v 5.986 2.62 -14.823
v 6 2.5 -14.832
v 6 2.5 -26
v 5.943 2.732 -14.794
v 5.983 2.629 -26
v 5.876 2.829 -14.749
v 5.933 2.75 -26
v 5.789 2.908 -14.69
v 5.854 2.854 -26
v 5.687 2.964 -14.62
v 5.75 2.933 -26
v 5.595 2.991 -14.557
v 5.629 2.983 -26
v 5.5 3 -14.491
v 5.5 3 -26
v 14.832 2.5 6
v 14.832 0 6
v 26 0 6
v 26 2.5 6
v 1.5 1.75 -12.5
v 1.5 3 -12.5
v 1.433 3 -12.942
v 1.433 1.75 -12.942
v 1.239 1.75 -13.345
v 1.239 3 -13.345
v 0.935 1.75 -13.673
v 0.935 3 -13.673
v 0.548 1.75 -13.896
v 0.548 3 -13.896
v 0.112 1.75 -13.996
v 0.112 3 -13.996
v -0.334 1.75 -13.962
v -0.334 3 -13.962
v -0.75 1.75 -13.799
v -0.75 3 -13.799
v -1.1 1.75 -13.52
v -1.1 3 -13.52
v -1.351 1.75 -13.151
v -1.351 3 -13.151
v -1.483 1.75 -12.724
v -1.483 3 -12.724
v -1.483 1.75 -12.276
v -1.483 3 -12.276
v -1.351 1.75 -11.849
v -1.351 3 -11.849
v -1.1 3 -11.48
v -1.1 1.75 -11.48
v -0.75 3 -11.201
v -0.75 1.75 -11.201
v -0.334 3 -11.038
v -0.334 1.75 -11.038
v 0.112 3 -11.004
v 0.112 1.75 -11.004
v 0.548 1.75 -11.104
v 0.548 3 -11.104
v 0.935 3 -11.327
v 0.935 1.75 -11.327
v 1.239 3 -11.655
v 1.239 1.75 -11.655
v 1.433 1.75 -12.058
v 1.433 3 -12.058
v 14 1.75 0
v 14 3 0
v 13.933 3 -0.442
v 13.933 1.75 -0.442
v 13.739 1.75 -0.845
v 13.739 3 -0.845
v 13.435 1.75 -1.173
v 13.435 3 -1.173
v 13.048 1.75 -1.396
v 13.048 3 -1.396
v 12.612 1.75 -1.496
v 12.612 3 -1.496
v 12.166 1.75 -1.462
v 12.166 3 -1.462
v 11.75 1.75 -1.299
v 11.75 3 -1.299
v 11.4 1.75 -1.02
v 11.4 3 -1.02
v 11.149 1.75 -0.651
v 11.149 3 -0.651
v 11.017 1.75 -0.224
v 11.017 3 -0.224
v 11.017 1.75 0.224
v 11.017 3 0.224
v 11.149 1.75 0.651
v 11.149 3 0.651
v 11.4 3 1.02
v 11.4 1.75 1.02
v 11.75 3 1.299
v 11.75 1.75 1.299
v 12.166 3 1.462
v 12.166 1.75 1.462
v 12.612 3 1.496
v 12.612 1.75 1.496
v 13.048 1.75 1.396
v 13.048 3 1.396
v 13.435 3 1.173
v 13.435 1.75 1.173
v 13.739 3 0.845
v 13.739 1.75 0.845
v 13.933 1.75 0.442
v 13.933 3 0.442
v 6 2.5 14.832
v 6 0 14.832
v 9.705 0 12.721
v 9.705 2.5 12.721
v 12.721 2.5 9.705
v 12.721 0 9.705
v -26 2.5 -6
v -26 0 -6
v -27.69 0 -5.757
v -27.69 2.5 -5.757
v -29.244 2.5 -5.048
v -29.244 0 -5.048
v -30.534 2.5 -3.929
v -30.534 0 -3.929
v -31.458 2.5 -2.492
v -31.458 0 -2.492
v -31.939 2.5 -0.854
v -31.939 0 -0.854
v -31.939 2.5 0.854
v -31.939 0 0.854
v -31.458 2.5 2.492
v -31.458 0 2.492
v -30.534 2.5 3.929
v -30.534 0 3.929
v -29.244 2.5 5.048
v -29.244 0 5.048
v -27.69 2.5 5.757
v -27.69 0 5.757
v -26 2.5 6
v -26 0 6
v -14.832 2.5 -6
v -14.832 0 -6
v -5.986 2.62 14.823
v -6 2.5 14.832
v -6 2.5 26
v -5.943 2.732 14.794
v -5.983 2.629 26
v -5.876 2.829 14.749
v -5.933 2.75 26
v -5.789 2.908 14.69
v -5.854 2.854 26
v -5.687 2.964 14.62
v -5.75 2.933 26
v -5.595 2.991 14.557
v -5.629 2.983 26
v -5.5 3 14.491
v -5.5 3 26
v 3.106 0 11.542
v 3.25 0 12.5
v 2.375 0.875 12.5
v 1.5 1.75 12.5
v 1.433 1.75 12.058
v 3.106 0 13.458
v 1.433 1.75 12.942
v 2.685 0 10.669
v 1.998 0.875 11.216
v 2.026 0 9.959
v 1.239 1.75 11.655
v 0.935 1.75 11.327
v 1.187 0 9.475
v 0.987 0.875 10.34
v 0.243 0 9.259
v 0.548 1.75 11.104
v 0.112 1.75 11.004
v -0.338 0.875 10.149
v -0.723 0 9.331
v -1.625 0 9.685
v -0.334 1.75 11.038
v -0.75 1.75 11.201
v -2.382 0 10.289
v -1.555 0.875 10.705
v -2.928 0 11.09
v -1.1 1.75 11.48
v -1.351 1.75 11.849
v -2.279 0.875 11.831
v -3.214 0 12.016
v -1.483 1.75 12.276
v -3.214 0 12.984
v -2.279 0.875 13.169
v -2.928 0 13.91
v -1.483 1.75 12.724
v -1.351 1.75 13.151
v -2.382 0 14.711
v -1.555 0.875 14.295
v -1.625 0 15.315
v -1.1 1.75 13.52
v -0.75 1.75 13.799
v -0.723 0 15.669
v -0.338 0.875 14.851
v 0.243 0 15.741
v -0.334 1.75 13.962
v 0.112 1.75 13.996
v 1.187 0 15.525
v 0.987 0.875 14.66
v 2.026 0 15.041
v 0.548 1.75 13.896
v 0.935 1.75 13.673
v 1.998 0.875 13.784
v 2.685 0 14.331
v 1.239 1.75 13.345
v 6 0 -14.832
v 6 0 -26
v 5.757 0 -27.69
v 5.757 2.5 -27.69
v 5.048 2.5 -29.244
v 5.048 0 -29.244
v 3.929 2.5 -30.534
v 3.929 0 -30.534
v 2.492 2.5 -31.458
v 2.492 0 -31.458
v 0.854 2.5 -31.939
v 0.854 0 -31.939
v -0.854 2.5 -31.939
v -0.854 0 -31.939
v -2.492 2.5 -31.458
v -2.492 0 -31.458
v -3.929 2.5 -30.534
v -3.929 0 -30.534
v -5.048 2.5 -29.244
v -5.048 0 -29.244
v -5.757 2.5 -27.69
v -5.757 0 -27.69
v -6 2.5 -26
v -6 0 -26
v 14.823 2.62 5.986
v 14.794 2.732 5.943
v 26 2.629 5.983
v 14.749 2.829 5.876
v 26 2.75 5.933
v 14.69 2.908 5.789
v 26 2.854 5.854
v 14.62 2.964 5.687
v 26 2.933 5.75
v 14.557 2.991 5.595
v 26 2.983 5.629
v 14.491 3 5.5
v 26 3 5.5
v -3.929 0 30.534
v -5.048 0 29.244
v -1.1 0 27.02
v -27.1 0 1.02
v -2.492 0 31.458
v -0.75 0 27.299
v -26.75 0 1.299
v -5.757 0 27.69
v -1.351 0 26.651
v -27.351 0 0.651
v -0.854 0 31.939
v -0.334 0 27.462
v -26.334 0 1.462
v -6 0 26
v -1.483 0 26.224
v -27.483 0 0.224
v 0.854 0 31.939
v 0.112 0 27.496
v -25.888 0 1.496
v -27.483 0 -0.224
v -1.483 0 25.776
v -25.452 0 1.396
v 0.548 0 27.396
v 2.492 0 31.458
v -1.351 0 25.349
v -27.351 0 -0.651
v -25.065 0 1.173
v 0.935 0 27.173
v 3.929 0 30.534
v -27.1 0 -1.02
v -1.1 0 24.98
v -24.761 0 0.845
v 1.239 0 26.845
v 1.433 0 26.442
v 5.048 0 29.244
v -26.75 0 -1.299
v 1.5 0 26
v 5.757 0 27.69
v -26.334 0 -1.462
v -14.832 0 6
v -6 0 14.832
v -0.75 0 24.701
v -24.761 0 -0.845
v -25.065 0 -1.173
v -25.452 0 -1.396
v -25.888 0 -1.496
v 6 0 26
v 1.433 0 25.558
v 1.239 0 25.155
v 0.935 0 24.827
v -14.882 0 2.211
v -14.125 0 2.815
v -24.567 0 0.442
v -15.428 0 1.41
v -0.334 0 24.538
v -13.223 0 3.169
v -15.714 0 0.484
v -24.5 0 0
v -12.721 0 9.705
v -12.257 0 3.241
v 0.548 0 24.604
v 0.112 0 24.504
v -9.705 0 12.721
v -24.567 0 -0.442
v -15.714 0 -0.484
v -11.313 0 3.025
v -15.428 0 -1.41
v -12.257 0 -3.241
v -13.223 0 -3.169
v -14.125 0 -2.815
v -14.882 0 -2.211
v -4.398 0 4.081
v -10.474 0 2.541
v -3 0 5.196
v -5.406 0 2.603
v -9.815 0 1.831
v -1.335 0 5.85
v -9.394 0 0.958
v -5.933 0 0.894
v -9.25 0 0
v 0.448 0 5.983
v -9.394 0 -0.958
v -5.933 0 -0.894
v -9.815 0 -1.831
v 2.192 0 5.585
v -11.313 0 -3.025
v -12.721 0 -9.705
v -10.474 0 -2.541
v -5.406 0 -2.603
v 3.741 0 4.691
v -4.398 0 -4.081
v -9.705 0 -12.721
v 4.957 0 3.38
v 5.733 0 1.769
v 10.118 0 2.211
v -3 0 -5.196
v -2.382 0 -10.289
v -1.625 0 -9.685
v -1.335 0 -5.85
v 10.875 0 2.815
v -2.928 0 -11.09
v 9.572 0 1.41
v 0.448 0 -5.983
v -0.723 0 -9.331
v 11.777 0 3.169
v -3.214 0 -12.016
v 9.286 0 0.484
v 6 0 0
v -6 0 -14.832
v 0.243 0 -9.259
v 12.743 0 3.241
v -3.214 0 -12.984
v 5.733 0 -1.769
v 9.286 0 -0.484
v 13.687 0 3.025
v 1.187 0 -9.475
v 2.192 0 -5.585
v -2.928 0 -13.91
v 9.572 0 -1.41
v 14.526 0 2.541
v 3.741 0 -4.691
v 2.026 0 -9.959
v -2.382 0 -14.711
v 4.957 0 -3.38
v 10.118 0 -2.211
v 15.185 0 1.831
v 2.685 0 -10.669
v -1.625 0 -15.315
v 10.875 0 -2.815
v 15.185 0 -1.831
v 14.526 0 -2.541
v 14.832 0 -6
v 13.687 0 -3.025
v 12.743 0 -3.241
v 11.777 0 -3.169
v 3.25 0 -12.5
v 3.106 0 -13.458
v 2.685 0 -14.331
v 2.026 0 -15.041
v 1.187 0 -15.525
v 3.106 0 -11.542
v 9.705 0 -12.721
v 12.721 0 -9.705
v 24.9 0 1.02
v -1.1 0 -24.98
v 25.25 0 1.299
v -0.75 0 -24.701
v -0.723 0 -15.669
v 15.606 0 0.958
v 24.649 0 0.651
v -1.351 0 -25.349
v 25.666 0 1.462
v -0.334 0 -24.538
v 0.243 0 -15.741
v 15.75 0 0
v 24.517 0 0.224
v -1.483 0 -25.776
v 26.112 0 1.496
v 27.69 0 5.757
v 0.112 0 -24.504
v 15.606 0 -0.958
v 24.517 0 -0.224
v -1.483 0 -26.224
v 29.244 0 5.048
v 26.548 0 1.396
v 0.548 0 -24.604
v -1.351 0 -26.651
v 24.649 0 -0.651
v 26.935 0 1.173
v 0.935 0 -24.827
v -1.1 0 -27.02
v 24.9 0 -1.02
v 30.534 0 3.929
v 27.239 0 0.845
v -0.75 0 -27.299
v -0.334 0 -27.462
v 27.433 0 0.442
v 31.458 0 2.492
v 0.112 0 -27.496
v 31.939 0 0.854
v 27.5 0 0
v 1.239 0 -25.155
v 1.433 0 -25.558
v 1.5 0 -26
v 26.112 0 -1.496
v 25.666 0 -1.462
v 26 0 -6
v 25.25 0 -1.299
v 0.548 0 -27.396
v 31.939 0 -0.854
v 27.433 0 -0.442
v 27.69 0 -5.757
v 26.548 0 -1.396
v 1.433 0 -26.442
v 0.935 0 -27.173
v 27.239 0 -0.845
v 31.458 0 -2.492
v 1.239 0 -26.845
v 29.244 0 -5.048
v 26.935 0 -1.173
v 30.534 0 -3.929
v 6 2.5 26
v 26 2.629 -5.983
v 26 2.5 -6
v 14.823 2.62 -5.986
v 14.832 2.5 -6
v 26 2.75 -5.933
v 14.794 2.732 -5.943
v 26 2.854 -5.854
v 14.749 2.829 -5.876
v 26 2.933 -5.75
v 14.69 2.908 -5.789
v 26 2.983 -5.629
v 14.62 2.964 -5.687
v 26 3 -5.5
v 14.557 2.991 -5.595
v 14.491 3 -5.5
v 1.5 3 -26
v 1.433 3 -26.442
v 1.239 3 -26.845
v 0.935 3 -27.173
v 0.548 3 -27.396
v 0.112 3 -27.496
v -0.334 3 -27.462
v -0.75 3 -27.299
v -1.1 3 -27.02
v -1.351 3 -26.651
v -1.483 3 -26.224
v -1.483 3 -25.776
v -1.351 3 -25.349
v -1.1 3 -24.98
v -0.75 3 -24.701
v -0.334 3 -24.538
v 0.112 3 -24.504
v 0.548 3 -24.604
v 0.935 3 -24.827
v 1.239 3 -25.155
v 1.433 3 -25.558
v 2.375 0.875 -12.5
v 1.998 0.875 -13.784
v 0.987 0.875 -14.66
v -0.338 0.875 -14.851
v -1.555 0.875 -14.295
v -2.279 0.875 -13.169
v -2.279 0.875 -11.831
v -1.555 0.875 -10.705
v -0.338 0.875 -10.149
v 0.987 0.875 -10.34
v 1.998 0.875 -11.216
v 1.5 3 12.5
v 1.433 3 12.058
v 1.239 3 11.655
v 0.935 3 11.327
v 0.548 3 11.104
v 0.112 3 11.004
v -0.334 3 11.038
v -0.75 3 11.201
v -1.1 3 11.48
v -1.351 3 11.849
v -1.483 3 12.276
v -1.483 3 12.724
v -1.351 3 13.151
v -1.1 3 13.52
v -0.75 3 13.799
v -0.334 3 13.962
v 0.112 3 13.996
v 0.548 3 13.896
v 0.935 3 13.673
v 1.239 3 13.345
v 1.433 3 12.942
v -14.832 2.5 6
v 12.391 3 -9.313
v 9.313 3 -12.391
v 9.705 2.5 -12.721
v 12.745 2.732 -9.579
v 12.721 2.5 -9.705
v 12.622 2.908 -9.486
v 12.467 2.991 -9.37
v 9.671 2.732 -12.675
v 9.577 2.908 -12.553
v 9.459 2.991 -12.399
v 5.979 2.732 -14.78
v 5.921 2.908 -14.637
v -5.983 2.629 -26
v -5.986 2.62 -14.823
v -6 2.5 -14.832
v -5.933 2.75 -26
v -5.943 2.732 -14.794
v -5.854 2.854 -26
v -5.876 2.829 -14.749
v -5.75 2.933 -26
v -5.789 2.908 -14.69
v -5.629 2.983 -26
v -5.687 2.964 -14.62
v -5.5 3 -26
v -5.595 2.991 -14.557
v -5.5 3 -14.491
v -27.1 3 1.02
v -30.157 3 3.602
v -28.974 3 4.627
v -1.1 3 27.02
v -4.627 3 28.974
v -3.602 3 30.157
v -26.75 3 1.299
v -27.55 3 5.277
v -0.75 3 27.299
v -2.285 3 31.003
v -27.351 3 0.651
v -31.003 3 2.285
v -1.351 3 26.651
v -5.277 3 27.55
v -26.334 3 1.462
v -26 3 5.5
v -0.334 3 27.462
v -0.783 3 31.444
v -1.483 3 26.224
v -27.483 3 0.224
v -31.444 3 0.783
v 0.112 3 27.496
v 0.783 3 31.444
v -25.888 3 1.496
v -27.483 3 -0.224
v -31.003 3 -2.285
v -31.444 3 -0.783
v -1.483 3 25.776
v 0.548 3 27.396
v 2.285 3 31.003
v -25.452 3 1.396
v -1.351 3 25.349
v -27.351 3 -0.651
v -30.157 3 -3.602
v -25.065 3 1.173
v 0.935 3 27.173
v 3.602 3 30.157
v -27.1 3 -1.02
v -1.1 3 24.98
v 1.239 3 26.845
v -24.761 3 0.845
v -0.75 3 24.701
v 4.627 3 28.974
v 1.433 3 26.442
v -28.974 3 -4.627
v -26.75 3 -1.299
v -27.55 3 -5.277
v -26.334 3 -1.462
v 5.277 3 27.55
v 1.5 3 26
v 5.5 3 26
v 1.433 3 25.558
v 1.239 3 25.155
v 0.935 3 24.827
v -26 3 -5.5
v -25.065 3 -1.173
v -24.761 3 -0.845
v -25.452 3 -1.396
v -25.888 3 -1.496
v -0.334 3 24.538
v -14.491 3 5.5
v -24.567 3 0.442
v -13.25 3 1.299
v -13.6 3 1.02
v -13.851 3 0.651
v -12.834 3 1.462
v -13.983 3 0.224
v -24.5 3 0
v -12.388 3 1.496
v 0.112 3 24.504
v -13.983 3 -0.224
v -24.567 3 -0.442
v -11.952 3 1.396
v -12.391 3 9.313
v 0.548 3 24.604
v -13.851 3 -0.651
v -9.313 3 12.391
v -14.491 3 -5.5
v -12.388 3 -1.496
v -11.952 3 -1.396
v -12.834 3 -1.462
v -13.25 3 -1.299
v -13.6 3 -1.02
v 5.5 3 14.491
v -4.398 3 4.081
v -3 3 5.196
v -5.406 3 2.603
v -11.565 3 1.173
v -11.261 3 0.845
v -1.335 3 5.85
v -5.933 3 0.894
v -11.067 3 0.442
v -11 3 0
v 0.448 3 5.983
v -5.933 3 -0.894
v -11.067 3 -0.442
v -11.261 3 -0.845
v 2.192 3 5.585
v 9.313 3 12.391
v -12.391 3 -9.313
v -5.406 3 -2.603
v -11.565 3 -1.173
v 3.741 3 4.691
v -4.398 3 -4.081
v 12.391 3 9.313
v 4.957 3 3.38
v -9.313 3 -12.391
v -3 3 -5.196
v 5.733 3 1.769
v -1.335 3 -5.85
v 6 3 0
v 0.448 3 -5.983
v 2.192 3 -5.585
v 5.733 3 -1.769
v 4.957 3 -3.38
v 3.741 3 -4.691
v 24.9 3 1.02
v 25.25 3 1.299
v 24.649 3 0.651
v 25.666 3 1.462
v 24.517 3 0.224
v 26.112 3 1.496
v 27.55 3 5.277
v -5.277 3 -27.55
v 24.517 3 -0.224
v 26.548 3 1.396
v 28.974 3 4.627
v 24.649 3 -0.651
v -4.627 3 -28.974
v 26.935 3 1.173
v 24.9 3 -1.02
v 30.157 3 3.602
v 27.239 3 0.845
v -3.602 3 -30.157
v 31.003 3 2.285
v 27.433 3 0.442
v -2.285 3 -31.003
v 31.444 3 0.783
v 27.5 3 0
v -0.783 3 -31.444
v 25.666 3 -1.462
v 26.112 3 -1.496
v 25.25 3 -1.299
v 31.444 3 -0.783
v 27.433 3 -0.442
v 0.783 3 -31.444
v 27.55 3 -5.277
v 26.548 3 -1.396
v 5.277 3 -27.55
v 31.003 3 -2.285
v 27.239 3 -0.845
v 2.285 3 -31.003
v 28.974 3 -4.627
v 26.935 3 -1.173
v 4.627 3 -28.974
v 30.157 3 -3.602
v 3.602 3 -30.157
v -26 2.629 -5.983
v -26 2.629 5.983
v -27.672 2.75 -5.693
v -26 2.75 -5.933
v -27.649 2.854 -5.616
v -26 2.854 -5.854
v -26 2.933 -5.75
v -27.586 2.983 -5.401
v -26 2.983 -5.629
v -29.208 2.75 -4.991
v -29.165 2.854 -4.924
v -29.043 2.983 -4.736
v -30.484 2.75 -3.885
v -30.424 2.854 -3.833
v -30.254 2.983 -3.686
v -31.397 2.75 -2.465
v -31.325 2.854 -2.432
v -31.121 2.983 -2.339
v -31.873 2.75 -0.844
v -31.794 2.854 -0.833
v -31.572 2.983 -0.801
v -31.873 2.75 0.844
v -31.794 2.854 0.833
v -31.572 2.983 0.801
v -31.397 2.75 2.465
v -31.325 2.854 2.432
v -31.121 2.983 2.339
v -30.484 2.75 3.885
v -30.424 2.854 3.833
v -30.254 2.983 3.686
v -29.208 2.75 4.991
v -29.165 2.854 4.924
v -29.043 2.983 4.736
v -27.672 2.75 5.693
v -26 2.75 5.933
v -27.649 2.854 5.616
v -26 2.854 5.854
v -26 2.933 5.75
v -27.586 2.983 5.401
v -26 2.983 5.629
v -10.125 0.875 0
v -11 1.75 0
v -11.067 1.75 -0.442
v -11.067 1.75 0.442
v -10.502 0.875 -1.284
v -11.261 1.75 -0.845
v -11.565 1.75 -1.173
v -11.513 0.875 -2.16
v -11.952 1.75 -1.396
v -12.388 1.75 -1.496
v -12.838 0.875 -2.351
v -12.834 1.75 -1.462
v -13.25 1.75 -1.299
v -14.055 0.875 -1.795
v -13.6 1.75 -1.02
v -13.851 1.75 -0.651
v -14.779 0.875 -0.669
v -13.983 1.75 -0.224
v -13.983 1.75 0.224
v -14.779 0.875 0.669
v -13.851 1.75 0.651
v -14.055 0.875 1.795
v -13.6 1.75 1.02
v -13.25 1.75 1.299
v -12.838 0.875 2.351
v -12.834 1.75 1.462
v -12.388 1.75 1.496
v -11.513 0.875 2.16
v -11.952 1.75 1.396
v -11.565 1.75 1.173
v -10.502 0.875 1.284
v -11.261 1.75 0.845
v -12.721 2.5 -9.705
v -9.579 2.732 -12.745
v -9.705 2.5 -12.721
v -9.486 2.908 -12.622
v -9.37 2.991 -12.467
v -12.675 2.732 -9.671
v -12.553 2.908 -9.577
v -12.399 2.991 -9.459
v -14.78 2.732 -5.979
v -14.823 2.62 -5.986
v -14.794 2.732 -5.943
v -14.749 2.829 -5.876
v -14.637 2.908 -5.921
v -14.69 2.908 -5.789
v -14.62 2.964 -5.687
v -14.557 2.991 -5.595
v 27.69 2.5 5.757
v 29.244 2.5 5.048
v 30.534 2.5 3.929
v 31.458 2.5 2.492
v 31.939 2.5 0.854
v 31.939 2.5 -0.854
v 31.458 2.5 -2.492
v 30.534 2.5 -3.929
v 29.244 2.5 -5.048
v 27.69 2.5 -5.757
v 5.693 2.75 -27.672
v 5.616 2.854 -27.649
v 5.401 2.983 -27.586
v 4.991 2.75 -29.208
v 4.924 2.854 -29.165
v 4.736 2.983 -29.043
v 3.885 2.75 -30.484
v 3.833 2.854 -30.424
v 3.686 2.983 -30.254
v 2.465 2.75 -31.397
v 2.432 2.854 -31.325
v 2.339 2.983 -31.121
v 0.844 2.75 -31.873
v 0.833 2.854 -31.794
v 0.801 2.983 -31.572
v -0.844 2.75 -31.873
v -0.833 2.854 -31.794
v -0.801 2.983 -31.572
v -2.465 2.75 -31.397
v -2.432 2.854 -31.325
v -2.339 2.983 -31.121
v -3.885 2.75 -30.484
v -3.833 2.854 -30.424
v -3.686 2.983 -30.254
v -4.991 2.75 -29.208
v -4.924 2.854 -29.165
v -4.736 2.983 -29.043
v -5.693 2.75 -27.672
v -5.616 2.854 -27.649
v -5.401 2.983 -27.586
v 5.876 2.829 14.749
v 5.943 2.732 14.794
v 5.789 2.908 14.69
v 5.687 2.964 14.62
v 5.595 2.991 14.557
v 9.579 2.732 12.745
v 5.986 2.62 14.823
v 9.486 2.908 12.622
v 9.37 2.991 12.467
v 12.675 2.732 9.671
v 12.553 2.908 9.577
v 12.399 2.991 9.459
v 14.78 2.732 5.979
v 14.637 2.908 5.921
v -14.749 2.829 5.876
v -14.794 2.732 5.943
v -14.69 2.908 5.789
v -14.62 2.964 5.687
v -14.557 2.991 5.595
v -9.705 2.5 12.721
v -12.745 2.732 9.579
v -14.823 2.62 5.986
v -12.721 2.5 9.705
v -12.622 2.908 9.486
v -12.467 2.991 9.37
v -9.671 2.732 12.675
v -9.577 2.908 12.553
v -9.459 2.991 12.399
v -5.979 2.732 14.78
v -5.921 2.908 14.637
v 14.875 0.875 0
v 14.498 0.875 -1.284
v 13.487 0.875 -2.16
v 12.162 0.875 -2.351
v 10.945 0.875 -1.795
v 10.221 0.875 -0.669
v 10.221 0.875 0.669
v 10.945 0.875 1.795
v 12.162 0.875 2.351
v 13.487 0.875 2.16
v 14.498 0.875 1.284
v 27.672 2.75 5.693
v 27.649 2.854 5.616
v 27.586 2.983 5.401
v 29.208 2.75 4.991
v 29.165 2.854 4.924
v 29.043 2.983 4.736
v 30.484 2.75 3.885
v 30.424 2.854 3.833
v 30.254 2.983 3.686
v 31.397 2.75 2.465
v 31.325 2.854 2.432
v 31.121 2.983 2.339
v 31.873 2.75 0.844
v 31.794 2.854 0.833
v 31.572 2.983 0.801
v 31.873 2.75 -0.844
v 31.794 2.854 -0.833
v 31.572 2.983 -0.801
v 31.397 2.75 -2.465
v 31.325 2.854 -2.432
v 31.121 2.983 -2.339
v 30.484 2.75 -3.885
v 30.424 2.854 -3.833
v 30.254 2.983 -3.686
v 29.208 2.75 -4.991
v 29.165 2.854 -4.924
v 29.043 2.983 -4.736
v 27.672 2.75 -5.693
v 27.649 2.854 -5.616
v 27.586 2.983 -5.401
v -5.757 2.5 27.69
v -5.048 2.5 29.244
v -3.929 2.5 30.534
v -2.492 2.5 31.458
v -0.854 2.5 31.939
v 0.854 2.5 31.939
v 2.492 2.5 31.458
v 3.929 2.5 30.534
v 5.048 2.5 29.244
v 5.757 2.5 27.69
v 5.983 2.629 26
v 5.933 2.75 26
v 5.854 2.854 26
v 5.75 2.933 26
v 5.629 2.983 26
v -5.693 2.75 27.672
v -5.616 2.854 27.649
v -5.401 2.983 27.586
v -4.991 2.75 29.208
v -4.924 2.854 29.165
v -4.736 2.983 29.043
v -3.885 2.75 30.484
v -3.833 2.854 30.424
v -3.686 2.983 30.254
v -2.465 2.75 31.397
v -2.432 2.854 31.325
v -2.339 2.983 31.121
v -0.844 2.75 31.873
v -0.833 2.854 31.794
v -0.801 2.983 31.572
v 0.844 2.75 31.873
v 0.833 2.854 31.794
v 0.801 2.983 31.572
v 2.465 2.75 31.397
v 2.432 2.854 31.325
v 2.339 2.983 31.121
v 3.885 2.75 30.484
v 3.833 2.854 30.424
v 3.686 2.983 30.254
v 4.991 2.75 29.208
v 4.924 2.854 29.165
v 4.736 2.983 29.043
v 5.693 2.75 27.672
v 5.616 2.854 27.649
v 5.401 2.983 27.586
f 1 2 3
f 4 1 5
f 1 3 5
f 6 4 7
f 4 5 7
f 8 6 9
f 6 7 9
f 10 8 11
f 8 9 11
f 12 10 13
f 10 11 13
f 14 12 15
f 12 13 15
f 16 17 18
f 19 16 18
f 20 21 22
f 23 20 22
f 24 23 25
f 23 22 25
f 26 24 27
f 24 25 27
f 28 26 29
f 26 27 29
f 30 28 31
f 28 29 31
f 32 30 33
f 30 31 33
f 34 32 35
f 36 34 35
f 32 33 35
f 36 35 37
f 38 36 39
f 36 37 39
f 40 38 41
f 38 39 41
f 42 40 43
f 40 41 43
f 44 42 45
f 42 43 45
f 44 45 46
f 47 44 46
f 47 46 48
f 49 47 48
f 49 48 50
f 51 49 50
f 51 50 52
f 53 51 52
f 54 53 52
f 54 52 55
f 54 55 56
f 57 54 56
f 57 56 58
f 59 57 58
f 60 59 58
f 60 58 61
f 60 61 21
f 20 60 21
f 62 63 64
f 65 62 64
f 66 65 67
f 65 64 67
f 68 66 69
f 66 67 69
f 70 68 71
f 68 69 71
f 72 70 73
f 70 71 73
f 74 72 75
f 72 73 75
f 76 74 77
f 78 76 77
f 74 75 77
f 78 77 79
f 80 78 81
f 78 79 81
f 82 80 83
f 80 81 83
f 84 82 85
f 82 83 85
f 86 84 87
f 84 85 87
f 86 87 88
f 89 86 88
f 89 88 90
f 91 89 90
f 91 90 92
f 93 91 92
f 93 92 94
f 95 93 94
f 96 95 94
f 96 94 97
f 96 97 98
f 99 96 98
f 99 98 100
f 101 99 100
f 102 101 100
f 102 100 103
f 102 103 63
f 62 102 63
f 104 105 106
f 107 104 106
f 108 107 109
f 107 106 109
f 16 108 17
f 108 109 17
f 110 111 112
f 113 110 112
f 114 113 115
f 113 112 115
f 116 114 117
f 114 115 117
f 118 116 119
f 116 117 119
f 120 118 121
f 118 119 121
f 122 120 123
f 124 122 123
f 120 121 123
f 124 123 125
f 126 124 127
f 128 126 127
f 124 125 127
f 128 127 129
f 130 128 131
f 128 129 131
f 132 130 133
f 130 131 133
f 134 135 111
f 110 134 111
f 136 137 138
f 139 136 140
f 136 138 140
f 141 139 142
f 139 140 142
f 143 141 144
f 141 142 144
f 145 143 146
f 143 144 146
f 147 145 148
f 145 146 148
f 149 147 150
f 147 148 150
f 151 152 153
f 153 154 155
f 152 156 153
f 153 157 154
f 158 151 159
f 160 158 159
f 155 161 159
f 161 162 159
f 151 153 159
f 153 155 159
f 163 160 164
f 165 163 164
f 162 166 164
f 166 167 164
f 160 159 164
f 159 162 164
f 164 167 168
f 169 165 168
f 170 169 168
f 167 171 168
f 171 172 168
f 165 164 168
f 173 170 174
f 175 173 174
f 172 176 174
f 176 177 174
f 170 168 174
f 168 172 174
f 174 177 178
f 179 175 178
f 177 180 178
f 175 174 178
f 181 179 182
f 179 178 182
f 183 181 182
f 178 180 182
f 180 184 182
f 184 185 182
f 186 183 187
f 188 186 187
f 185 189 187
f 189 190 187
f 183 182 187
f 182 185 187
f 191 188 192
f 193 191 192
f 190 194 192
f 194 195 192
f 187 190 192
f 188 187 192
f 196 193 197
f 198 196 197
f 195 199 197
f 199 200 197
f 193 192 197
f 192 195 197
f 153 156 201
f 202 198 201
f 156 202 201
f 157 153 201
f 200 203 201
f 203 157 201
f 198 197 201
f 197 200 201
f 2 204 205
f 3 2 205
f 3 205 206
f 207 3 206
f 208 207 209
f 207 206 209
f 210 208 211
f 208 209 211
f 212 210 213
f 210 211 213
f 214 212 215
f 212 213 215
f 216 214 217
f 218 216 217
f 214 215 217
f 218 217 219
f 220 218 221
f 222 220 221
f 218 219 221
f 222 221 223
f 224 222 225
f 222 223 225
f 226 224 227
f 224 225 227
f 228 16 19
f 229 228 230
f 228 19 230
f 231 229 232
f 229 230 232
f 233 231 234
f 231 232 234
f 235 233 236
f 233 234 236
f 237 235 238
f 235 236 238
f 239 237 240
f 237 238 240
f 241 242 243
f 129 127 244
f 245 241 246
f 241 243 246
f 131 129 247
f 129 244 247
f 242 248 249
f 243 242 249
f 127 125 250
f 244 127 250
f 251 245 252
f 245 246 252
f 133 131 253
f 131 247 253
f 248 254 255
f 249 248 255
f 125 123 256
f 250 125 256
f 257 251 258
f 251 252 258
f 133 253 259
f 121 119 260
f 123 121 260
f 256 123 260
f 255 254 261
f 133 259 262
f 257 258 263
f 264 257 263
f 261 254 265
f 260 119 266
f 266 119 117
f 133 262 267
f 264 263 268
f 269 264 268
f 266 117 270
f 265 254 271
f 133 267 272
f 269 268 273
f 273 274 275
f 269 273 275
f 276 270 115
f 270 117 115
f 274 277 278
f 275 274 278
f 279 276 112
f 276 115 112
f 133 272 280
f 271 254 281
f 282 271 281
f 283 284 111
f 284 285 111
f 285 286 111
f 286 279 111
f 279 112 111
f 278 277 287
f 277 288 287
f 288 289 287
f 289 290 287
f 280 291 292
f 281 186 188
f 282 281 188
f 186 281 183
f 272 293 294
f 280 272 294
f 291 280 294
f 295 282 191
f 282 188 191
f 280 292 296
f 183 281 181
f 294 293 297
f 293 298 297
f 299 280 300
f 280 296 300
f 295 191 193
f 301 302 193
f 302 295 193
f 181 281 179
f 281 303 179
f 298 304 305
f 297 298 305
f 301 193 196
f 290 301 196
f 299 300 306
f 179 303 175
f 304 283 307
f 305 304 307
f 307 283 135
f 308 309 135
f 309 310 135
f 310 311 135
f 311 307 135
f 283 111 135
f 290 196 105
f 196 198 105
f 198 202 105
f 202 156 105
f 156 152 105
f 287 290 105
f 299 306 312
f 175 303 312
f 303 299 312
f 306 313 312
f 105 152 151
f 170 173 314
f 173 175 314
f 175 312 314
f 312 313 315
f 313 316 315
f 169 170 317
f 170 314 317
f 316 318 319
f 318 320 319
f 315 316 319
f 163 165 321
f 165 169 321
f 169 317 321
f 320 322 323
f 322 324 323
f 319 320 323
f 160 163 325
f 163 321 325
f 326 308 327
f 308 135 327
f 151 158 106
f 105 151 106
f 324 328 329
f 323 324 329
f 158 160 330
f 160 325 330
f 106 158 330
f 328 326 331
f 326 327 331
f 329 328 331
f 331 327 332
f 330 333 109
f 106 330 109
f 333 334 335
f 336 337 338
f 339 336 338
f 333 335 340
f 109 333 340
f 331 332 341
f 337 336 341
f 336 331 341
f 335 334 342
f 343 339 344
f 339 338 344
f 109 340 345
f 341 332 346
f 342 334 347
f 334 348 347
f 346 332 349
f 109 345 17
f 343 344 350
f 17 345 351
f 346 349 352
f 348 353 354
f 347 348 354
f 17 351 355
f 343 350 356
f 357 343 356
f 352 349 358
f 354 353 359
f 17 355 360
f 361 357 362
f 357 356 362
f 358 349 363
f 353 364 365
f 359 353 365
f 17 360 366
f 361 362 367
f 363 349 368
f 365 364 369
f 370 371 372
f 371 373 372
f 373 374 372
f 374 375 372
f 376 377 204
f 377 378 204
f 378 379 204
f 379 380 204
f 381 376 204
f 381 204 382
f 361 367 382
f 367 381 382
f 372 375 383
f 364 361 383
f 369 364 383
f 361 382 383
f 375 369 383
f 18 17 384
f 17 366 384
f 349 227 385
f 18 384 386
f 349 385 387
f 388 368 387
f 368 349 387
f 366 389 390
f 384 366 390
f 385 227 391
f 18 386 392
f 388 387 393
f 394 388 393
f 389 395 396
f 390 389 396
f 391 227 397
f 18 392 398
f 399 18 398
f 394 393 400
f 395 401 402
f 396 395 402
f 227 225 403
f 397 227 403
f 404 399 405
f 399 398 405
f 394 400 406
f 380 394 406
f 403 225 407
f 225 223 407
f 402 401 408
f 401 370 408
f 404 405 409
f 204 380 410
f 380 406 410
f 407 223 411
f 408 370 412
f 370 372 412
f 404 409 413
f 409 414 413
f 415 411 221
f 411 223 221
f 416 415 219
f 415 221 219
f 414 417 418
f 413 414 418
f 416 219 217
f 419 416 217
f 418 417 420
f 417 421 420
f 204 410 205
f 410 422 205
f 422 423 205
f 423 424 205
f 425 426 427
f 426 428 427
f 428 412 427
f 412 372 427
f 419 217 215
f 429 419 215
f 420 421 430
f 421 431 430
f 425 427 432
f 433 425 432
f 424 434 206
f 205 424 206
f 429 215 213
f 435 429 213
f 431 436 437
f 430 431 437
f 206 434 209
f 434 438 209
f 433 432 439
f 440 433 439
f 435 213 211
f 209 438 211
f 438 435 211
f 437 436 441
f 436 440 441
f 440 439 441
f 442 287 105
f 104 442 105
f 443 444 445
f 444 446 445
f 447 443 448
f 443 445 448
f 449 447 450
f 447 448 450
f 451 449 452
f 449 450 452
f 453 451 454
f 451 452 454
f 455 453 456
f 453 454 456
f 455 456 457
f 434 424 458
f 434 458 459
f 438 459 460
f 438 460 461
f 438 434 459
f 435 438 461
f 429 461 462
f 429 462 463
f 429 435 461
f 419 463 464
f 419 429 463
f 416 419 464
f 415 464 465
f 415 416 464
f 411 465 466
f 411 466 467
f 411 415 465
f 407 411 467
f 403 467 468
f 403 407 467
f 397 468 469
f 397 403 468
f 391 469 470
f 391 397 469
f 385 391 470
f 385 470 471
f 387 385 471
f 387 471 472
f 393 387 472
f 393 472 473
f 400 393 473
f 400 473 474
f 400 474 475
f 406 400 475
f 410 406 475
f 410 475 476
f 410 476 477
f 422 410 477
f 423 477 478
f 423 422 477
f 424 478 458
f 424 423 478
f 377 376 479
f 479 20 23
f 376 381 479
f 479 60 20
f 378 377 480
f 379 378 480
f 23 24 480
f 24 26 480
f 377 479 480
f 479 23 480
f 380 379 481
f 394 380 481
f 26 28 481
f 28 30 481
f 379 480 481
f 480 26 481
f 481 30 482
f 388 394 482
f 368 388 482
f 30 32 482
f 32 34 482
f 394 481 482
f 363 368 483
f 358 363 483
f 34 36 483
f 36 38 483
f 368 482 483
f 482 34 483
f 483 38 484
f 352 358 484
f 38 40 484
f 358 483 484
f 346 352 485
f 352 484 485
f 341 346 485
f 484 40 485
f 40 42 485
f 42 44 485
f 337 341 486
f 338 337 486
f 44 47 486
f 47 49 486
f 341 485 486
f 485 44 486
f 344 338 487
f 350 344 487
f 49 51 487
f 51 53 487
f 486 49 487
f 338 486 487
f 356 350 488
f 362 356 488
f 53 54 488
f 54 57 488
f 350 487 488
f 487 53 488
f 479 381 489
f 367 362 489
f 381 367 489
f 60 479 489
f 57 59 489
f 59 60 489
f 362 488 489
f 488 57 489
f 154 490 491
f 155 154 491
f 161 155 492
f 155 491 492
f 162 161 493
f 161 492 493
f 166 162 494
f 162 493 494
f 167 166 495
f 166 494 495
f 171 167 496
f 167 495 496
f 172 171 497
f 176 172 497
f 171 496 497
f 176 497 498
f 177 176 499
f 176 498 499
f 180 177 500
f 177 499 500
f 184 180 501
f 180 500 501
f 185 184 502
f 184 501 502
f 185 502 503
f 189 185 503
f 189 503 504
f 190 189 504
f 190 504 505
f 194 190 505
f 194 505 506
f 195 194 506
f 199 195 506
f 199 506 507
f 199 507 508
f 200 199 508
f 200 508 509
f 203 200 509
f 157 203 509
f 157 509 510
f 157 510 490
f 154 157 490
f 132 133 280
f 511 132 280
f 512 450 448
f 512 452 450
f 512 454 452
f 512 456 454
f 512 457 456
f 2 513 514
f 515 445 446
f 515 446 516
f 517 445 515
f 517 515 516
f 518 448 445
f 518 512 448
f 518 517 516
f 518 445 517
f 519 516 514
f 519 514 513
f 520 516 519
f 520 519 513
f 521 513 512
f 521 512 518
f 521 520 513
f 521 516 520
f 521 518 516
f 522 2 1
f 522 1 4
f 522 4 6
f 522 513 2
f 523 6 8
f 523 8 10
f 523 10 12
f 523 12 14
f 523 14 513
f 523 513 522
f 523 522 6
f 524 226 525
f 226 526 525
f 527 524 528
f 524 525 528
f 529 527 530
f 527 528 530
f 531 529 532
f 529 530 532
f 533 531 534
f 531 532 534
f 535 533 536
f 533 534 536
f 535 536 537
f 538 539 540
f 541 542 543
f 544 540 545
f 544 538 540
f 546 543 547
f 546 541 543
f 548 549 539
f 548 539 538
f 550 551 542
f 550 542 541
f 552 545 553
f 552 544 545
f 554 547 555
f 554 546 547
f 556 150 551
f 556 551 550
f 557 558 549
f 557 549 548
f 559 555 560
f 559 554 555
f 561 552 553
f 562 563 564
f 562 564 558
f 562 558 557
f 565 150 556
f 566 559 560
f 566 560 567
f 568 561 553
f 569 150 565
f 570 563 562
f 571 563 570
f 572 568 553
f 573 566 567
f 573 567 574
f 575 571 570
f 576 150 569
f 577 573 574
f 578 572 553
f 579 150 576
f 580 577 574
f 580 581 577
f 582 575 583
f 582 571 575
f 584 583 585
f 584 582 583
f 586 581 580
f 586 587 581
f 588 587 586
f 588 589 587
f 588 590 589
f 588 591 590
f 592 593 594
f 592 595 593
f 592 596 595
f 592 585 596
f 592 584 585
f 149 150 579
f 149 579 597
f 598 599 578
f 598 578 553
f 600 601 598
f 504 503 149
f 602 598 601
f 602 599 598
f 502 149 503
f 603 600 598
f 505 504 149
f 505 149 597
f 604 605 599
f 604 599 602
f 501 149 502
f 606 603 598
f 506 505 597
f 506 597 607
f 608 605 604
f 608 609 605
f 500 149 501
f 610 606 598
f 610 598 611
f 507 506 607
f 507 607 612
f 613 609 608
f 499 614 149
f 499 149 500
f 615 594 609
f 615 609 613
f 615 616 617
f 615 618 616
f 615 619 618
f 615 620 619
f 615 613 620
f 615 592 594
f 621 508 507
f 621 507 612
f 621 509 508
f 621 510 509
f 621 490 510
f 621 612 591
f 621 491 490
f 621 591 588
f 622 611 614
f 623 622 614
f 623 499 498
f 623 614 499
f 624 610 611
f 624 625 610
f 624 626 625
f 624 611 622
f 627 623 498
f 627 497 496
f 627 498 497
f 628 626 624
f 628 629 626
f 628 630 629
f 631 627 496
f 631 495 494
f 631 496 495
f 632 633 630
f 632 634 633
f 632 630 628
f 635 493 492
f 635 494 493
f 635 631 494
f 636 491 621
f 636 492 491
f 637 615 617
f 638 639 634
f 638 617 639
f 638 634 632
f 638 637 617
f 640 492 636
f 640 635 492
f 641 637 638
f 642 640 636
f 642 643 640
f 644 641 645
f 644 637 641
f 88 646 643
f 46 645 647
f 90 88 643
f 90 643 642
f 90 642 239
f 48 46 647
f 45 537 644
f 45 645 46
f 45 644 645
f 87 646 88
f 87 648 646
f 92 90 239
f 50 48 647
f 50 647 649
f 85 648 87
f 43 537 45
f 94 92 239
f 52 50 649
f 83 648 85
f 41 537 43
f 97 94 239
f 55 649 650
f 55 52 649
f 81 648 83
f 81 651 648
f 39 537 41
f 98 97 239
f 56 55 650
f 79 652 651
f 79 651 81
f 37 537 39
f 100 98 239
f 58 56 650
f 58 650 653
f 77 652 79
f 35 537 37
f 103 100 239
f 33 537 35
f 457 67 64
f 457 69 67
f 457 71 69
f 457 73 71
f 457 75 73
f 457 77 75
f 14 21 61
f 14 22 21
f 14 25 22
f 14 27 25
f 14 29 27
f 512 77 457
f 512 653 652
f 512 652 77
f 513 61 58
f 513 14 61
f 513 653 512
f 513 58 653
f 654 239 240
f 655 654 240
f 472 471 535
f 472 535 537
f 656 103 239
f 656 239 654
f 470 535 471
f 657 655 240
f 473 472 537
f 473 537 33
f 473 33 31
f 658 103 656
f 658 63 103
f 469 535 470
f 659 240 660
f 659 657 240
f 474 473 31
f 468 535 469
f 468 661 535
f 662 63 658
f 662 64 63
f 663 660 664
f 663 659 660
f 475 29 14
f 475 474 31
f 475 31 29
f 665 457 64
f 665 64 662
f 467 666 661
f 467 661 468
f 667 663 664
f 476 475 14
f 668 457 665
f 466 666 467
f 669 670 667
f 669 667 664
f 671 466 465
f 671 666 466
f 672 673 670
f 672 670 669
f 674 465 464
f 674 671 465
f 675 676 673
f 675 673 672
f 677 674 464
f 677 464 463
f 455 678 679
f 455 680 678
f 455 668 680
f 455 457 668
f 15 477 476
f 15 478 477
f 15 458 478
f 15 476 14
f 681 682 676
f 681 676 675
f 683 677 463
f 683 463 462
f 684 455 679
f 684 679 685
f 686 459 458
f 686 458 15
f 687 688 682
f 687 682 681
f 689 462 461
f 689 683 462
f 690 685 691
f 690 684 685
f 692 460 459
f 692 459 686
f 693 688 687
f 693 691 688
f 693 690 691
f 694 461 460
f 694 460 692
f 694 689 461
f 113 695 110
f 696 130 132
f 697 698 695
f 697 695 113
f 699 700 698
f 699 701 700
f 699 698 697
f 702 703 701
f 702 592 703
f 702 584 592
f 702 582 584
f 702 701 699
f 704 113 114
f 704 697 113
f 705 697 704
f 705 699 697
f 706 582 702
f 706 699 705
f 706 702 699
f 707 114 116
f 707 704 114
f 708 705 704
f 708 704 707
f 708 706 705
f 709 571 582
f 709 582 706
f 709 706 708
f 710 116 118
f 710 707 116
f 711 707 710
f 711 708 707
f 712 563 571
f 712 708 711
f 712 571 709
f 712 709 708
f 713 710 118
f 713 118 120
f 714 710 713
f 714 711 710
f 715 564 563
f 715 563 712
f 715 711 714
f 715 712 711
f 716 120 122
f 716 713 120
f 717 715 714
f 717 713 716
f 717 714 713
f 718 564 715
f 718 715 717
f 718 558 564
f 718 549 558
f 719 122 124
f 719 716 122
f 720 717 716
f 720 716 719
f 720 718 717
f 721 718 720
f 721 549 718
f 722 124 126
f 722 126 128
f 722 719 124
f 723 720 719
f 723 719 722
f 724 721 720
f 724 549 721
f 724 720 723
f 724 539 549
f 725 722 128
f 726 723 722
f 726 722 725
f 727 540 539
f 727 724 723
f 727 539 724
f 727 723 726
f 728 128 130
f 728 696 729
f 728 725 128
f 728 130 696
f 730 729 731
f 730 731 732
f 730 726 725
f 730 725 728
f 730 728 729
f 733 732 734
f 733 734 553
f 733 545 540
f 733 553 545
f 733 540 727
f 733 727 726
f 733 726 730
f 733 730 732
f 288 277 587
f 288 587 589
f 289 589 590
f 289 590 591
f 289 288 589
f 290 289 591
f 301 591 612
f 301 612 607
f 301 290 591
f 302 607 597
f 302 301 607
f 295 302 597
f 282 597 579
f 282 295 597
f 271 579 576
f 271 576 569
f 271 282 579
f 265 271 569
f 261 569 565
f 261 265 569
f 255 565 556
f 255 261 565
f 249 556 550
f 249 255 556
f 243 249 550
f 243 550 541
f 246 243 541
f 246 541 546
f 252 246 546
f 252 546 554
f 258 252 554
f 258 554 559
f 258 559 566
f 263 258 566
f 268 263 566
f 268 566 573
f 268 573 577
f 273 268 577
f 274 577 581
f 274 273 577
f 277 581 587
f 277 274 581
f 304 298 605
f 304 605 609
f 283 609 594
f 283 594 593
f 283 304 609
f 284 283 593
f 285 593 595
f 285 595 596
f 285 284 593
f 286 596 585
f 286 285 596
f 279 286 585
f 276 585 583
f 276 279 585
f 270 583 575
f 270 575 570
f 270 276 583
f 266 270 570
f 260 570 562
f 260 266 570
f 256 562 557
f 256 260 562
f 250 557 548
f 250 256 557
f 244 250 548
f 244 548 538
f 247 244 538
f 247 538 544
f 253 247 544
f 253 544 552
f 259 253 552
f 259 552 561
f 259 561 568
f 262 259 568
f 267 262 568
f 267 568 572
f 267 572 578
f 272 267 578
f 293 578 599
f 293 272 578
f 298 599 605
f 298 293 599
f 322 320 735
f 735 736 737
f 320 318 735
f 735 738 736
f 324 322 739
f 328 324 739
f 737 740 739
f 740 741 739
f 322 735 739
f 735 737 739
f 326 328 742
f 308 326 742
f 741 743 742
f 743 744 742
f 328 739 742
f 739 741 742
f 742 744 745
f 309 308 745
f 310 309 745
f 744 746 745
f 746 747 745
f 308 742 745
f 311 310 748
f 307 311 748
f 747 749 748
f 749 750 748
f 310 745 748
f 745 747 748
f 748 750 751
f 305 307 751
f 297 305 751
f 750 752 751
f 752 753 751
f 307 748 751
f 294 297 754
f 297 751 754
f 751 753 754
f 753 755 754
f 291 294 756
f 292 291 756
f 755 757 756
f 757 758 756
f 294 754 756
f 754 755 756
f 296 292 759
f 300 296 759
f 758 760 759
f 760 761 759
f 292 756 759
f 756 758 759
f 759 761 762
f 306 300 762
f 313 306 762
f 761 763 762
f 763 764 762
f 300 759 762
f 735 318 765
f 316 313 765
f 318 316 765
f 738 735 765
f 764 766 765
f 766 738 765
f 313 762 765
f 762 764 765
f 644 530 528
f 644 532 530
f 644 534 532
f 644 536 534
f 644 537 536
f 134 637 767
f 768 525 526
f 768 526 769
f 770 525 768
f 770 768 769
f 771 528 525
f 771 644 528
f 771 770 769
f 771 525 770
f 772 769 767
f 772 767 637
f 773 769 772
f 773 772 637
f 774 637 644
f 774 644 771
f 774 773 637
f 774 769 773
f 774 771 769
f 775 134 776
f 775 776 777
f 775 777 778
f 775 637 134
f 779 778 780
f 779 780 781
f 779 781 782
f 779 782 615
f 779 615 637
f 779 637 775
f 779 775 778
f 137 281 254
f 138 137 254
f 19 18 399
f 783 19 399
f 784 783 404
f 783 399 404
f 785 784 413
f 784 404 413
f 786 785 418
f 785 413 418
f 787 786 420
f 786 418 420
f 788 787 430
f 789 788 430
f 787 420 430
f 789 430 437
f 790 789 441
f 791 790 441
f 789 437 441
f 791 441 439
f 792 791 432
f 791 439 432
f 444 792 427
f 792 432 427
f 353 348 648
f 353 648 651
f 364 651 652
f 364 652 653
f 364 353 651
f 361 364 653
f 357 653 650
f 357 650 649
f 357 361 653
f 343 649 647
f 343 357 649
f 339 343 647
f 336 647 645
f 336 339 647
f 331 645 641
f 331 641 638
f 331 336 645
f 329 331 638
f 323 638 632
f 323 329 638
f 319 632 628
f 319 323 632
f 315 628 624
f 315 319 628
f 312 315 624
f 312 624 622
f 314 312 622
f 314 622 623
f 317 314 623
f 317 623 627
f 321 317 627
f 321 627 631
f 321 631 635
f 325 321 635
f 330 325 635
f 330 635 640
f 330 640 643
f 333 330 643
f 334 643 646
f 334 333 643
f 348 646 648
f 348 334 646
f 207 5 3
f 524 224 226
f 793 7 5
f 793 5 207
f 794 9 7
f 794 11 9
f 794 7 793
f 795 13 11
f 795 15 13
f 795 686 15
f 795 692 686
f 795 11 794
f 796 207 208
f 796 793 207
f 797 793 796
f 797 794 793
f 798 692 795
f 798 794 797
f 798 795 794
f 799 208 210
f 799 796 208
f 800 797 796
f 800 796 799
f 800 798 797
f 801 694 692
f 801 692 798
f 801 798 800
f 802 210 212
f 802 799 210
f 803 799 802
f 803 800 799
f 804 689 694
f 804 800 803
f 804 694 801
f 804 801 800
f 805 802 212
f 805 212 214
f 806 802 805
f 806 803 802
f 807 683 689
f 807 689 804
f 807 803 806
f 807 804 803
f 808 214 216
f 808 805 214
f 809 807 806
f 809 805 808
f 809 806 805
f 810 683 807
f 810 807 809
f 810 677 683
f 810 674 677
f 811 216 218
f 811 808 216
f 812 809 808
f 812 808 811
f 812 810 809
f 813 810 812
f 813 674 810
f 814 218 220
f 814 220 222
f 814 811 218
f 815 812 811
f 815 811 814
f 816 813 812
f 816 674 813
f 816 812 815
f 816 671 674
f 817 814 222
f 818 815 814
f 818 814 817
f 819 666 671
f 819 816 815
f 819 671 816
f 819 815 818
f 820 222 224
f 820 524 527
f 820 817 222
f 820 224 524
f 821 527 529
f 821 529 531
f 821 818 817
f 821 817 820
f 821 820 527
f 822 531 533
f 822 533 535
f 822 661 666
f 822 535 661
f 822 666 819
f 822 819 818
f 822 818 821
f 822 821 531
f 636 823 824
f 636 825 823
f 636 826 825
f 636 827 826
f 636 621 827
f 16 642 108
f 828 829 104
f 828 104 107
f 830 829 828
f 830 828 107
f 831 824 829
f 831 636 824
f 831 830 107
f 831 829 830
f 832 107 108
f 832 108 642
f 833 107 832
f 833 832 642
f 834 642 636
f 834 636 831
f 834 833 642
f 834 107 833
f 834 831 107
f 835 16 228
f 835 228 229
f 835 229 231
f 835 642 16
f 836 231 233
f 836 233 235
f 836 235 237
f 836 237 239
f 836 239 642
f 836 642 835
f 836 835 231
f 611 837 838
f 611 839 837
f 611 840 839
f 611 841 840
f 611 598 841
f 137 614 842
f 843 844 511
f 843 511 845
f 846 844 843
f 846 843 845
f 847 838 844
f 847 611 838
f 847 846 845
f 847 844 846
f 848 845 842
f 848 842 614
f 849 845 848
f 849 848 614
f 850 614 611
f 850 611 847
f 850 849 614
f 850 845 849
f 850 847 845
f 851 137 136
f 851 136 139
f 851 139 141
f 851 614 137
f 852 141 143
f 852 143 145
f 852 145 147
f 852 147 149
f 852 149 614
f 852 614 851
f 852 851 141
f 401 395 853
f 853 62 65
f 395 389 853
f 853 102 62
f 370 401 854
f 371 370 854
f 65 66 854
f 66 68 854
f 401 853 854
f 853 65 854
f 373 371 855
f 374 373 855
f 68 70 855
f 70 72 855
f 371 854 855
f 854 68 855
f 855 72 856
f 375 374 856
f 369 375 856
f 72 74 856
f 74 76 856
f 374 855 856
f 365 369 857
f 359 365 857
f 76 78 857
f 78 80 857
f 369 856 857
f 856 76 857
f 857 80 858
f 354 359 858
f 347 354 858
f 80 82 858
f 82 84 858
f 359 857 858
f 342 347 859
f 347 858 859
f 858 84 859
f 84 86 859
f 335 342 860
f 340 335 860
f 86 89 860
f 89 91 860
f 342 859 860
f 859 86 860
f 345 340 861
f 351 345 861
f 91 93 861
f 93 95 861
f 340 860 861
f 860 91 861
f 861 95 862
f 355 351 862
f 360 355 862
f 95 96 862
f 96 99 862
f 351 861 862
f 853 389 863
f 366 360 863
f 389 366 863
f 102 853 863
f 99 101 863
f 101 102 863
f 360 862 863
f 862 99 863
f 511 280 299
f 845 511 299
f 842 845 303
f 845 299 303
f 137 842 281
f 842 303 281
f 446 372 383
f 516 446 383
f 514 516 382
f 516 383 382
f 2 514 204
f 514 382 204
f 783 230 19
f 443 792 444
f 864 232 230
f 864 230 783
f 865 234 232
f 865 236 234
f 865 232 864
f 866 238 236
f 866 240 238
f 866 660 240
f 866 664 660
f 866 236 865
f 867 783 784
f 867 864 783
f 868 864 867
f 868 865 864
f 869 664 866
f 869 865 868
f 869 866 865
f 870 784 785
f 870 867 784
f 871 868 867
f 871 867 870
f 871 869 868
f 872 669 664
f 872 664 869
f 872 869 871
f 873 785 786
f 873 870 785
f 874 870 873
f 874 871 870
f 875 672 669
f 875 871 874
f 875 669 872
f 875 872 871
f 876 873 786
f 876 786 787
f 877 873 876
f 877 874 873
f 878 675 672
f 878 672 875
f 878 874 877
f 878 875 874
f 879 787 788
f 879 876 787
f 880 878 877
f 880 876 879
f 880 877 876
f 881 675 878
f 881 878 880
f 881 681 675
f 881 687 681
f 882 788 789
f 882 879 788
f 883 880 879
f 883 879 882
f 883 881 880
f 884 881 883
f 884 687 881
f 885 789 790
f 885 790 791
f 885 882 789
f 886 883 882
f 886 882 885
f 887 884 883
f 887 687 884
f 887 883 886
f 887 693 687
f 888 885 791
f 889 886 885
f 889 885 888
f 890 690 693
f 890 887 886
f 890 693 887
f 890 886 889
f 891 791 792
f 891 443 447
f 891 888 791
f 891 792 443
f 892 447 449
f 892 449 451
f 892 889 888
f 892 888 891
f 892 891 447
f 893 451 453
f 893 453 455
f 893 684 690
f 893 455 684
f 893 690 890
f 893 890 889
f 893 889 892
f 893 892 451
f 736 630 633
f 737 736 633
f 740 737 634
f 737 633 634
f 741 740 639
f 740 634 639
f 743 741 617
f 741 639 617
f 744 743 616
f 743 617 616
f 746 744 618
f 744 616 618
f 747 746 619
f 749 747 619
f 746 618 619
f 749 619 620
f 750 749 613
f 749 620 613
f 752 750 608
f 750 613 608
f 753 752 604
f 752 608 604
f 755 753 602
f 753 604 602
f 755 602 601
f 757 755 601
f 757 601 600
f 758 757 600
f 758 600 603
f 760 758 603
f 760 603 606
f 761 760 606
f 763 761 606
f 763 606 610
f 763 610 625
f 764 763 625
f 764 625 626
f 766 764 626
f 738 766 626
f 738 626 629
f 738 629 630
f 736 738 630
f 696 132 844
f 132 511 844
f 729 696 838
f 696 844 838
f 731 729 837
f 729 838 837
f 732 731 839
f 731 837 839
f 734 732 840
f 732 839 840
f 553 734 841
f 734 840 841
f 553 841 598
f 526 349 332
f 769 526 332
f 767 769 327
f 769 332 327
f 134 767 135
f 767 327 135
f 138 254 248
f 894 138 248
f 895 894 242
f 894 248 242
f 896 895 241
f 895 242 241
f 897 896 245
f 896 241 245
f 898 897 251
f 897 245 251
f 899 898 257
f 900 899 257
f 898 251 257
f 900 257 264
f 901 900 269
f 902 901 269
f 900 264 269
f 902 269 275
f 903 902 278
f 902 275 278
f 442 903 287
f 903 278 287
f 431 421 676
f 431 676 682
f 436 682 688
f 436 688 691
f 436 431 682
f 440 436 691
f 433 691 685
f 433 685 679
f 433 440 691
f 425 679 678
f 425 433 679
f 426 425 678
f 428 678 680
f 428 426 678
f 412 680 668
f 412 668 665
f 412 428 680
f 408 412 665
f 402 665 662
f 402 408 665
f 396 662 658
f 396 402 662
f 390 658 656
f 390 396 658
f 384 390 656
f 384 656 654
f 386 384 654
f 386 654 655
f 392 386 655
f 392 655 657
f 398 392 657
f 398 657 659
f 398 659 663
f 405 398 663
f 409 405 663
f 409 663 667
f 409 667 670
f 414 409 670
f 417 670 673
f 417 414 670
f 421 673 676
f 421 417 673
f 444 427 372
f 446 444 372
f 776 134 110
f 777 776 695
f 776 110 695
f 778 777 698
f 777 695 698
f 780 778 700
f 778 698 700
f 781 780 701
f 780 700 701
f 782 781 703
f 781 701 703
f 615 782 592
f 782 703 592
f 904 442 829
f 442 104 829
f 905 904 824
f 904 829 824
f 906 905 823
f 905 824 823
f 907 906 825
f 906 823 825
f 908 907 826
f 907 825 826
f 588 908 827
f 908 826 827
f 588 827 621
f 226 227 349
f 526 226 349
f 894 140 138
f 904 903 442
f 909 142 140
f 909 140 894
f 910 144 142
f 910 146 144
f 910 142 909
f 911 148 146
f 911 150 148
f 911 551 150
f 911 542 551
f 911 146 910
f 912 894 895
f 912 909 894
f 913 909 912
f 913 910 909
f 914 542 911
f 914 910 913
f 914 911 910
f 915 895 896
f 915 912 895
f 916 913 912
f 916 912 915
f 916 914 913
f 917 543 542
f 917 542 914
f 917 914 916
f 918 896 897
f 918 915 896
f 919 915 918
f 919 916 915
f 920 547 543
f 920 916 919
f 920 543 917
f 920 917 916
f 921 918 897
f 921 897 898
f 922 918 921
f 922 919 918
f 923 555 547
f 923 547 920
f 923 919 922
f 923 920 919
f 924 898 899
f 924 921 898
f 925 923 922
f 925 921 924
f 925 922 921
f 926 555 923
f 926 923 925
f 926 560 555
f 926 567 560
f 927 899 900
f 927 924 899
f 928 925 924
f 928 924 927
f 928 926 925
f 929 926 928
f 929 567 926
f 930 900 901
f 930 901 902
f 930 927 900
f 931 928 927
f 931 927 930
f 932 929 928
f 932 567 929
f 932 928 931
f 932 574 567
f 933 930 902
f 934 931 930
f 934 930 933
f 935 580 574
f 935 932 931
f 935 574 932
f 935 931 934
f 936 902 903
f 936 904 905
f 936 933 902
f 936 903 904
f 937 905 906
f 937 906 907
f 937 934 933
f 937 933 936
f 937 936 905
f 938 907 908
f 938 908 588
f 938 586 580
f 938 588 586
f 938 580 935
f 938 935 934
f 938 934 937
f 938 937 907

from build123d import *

# Parameters (mm, degrees)
SKETCH1_R           = 6
SKETCH1_R_2         = 1.5
BOSS_EXTRUDE1_DEPTH = 3
FILLET1_R           = 0.5
SKETCH2_R           = 1.5
CUT_EXTRUDE1_DEPTH  = 4
CHAMFER1_SIZE       = 1.75


with BuildPart() as part:
    # Sketch1 → Boss-Extrude1 (new body)
    with BuildSketch(Plane(origin=(0, 0, 0), x_dir=(1, 0, 0), z_dir=(0, 1, 0))):
        with BuildLine():
            Line((26, 6), (14.832396974, 6))
            ThreePointArc((14.832396974, 6), (11.313708499, 11.313708499), (6, 14.832396974))
            Line((6, 14.832396974), (6, 26))
            ThreePointArc((6, 26), (0, 32), (-6, 26))
            Line((-6, 26), (-6, 14.832396974))
            ThreePointArc((-6, 14.832396974), (-11.313708499, 11.313708499), (-14.832396974, 6))
            Line((-14.832396974, 6), (-26, 6))
            ThreePointArc((-26, 6), (-32, 0), (-26, -6))
            Line((-26, -6), (-14.832396974, -6))
            ThreePointArc((-14.832396974, -6), (-11.313708499, -11.313708499), (-6, -14.832396974))
            Line((-6, -14.832396974), (-6, -26))
            ThreePointArc((-6, -26), (0, -32), (6, -26))
            Line((6, -26), (6, -14.832396974))
            ThreePointArc((6, -14.832396974), (11.313708499, -11.313708499), (14.832396974, -6))
            Line((14.832396974, -6), (26, -6))
            ThreePointArc((26, -6), (32, 0), (26, 6))
        make_face()
        Circle(SKETCH1_R, mode=Mode.SUBTRACT)
        with Locations((0, 26)):
            Circle(SKETCH1_R_2, mode=Mode.SUBTRACT)
        with Locations((26, 0)):
            Circle(SKETCH1_R_2, mode=Mode.SUBTRACT)
        with Locations((0, -26)):
            Circle(SKETCH1_R_2, mode=Mode.SUBTRACT)
        with Locations((-26, 0)):
            Circle(SKETCH1_R_2, mode=Mode.SUBTRACT)
    extrude(amount=BOSS_EXTRUDE1_DEPTH)

    # Fillet1
    fillet1_edges = [part.edges().sort_by_distance(p)[0] for p in [
        (-11.313708499, 3, -11.313708499),
        (-20.416198487, 3, -6),
        (-32, 3, 0),
        (-20.416198487, 3, 6),
        (-11.313708499, 3, 11.313708499),
        (-6, 3, 20.416198487),
        (0, 3, 32),
        (6, 3, 20.416198487),
        (11.313708499, 3, 11.313708499),
        (20.416198487, 3, 6),
        (0, 3, -32),
        (32, 3, 0),
        (20.416198487, 3, -6),
        (11.313708499, 3, -11.313708499),
        (6, 3, -20.416198487),
        (-6, 3, -20.416198487),
    ]]
    fillet(fillet1_edges, radius=FILLET1_R)

    # Sketch2 → Cut-Extrude1 (cut, through all)
    with BuildSketch(Plane(origin=(0, 3, 0), x_dir=(1, 0, 0), z_dir=(0, 1, 0))):
        with Locations((0, 12.5)):
            Circle(SKETCH2_R)
        with Locations((12.5, 0)):
            Circle(SKETCH2_R)
        with Locations((0, -12.5)):
            Circle(SKETCH2_R)
        with Locations((-12.5, 0)):
            Circle(SKETCH2_R)
    extrude(amount=-CUT_EXTRUDE1_DEPTH, mode=Mode.SUBTRACT)

    # Chamfer1
    chamfer1_edges = [part.edges().sort_by_distance(p)[0] for p in [
        (-1.5, 0, -12.5),
        (11, 0, 0),
        (-1.5, 0, 12.5),
        (-14, 0, 0),
    ]]
    chamfer(chamfer1_edges, length=CHAMFER1_SIZE)


solid = part.part
